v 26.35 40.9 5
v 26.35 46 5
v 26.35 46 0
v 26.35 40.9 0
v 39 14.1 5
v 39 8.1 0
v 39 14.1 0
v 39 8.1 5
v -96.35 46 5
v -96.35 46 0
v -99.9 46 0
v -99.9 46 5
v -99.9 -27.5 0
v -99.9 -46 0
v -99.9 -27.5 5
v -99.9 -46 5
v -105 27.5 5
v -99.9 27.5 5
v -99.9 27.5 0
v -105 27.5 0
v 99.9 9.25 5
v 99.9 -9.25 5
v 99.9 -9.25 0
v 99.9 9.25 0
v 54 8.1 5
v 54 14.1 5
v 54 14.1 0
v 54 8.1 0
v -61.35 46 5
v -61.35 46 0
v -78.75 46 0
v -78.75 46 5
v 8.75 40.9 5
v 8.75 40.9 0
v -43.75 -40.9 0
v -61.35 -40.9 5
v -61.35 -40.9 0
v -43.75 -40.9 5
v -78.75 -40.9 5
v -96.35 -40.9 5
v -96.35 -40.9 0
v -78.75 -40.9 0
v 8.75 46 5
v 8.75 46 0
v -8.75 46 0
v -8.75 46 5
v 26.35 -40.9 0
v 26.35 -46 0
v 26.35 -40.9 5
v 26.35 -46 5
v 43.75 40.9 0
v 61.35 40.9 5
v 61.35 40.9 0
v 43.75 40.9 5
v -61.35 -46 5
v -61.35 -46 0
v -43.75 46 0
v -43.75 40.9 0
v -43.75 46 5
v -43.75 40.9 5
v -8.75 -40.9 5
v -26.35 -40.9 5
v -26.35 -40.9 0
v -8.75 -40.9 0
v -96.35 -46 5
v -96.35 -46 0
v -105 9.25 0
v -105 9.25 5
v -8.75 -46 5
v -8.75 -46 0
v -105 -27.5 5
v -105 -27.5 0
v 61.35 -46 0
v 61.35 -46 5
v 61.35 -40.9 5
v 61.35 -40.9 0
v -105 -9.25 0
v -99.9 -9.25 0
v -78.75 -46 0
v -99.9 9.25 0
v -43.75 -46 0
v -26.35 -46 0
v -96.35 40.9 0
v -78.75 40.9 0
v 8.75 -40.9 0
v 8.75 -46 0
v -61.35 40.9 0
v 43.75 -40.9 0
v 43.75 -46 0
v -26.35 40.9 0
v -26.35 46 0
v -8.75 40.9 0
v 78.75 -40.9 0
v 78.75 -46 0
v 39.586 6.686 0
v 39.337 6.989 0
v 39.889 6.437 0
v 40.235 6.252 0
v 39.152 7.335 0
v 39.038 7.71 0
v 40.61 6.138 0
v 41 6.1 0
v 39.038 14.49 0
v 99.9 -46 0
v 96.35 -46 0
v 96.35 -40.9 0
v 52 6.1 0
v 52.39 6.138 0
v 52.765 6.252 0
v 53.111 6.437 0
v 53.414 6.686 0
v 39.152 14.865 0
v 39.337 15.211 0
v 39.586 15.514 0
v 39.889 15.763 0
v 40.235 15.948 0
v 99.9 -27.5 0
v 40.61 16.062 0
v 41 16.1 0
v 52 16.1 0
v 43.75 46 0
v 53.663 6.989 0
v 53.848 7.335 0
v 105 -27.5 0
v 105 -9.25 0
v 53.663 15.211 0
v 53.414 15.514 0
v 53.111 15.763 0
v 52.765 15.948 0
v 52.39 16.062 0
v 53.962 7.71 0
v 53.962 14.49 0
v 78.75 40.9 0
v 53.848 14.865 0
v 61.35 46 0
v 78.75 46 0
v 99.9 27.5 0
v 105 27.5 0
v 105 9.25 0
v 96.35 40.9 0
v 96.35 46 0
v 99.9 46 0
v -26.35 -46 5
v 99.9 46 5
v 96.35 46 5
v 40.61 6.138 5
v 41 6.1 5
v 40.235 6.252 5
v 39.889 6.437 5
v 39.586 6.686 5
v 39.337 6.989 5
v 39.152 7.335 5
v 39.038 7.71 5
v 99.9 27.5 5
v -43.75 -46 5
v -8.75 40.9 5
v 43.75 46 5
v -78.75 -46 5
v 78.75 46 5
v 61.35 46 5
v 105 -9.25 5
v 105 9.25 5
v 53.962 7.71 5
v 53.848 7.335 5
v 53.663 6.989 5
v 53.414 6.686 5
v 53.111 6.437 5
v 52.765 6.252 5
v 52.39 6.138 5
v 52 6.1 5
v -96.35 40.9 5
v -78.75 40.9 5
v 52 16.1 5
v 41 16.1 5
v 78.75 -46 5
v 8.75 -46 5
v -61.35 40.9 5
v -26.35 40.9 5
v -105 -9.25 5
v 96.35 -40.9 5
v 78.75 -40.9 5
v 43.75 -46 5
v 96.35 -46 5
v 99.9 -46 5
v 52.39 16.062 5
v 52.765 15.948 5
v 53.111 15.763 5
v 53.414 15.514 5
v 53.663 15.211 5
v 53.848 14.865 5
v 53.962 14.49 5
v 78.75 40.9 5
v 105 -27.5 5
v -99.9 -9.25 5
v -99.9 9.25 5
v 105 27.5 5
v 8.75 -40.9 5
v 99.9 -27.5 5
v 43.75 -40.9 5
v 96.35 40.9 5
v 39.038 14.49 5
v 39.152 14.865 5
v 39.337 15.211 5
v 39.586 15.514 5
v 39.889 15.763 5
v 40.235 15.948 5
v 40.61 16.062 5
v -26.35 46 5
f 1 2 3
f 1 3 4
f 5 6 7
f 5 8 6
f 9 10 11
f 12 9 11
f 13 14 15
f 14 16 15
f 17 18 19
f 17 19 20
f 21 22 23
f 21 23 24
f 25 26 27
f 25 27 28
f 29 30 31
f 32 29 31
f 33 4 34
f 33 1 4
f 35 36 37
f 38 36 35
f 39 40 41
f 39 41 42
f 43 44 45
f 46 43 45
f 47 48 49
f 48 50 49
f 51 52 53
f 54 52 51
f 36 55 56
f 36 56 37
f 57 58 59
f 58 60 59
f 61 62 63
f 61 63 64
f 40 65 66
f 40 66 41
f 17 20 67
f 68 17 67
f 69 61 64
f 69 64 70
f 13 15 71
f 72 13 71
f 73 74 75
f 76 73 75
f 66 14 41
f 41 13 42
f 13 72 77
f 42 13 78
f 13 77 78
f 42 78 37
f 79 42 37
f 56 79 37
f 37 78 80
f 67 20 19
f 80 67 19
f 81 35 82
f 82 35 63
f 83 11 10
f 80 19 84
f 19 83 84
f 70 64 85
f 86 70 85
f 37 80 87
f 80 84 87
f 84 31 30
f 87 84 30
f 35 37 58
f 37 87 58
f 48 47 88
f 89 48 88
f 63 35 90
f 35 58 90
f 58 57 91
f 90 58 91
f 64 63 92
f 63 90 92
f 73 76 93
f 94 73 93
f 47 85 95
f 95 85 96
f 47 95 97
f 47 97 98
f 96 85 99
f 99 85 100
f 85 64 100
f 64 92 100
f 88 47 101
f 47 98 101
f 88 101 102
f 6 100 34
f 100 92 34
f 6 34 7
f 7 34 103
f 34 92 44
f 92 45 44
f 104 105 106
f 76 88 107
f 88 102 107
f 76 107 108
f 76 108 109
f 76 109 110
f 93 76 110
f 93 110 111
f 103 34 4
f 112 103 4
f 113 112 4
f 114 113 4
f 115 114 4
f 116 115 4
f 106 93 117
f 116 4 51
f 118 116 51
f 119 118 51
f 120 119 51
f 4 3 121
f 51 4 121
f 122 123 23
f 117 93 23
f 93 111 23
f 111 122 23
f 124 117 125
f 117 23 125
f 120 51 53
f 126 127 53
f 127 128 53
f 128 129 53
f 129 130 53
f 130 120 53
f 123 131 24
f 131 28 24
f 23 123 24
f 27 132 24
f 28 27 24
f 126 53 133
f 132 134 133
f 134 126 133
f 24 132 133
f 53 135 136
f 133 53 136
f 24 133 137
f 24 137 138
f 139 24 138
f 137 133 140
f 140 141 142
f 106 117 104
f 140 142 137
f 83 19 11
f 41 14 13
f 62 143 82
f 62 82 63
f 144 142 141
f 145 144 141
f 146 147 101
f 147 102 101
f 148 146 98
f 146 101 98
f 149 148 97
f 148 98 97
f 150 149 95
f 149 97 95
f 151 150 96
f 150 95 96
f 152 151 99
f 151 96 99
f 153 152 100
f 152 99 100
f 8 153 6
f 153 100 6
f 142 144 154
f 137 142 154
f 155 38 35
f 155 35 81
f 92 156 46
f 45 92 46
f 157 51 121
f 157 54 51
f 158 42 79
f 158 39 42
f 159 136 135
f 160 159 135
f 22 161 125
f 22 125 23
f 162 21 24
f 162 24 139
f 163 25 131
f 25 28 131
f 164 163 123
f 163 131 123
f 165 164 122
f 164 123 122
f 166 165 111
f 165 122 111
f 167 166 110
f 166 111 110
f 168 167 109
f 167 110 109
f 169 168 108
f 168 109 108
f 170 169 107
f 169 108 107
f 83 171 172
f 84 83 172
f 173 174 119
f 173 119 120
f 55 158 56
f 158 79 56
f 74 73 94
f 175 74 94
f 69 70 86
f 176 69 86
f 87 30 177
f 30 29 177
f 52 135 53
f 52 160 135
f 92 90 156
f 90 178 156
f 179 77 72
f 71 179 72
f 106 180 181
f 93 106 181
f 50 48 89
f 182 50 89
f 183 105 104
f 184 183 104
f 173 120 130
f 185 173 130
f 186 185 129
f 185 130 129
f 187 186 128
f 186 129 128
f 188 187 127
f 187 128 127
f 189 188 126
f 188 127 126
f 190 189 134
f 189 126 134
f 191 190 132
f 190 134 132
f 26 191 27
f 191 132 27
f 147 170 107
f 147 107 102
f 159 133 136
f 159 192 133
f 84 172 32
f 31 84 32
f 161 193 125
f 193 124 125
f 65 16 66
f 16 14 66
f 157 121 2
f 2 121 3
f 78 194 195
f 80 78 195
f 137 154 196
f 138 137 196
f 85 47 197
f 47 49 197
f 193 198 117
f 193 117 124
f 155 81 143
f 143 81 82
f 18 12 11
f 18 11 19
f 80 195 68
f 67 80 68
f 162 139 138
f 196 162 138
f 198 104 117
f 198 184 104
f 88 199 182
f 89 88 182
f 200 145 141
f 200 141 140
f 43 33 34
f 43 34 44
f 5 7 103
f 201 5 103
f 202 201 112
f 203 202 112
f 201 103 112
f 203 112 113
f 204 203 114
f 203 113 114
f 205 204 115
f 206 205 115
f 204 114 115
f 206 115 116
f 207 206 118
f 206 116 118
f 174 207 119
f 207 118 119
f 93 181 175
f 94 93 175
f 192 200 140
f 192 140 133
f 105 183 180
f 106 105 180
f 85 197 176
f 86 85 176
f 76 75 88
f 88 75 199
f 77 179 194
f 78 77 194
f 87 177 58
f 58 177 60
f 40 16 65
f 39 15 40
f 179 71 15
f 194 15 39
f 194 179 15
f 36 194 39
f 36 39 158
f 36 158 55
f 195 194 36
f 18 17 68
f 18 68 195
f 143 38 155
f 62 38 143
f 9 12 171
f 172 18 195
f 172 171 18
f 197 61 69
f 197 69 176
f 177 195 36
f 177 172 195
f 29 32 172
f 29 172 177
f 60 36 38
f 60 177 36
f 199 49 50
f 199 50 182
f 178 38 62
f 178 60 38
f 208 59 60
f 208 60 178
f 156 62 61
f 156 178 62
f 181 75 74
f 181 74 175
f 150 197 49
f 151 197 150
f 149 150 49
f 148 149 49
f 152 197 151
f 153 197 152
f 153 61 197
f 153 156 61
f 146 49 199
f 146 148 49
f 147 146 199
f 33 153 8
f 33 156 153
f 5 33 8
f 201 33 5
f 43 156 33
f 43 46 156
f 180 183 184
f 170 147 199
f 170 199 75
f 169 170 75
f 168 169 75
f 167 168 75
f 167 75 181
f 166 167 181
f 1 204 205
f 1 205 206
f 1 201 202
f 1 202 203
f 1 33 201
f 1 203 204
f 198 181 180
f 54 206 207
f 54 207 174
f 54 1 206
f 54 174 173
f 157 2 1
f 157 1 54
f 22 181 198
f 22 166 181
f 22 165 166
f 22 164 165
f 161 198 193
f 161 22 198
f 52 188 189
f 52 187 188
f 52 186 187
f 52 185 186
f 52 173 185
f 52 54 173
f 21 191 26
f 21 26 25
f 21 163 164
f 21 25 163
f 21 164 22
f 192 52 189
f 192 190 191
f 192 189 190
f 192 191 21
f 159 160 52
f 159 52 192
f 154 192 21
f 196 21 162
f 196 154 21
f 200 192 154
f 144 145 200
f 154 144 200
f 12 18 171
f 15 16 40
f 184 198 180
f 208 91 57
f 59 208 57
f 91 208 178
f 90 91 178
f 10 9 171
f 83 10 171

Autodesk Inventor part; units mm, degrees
ref_plane "YZ Plane" through (0, 0, 0) normal (1, 0, 0) x (0, 1, 0)
ref_plane "XZ Plane" through (0, 0, 0) normal (0, 1, 0) x (-1, 0, 0)
ref_plane "XY Plane" through (0, 0, 0) normal (0, 0, 1) x (1, 0, 0)
sketch "Sketch1" plane through (0, 0, 0) normal (0, 0, 1) x (1, 0, 0)
  line L0 (-105, -46) -> (105, -46)
  line L1 (105, -46) -> (105, 46)
  line L2 (105, 46) -> (-105, 46)
  line L3 (-105, 46) -> (-105, -46)
  line L4 (-105, -46) -> (105, 46) construction
  line L5 (105, -46) -> (-105, 46) construction
  point P0 (0, 0)
  dimension "d0" = 210
  dimension "d1" = 92
extrude "Extrusion1" add sketch "Sketch1" along normal blind 5
sketch "Sketch2" plane through (0, 0, 5) normal (0, 0, 1) x (1, 0, 0)
  line L0 (39, 16.1) -> (54, 16.1)
  line L1 (54, 16.1) -> (54, 6.1)
  line L2 (54, 6.1) -> (39, 6.1)
  line L3 (39, 6.1) -> (39, 16.1)
  line L4 (-3, 9.6) -> (85, 9.6) construction
  line L5 (85, 9.6) -> (85, 8) construction
  line L6 (85, 8) -> (-3, 8) construction
  line L7 (-3, 8) -> (-3, 9.6) construction
  line L8 (-105, -46) -> (105, -46) construction
  line L9 (7.25, 15.6) -> (17.25, 15.6)
  line L10 (17.25, 15.6) -> (17.25, 10.6)
  line L11 (17.25, 10.6) -> (7.25, 10.6)
  line L12 (7.25, 10.6) -> (7.25, 15.6)
  line L13 (105, -46) -> (105, 46) projected
  line L14 (17.25, 10.6) -> (7.25, 15.6) construction
  line L15 (17.25, 15.6) -> (7.25, 10.6) construction
  line L16 (54, 6.1) -> (39, 16.1) construction
  line L17 (39, 6.1) -> (54, 16.1) construction
  point P0 (0, 0)
  point P1 (85, 8.8)
  point P2 (54, 11.1)
  point P3 (12.25, 13.1)
  point P4 (12.25, 13.1)
  point P5 (46.5, 11.1)
  point P6 (46.5, 11.1)
  dimension "d4" = 1.6
  dimension "d5" = 55.6
  dimension "d7" = 15
  dimension "d8" = 10
  dimension "d9" = 10
  dimension "d10" = 5
  dimension "d12" = 88
  dimension "d13" = 20
  dimension "d17" = 3.5
  dimension "d18" = 72.75
  dimension "d19" = 1.5
  dimension "d20" = 38.5
extrude "Extrusion2" cut sketch "Sketch2" against normal blind 5 contours L0 L1 L2 L3
fillet "Fillet1" radius 2 4 edges at (39, 16.1, 2.5) (39, 6.1, 2.5) (54, 6.1, 2.5) (54, 16.1, 2.5)
sketch "Sketch3" plane through (0, 0, 5) normal (0, 0, 1) x (1, 0, 0)
  line L0 (-8.75, 46) -> (-26.35, 46)
  line L1 (-26.35, 46) -> (-26.35, 40.9)
  line L2 (-26.35, 40.9) -> (-8.75, 40.9)
  line L3 (-8.75, 40.9) -> (-8.75, 46)
  line L4 (-43.75, 46) -> (-61.35, 46)
  line L5 (-61.35, 46) -> (-61.35, 40.9)
  line L6 (-61.35, 40.9) -> (-43.75, 40.9)
  line L7 (-43.75, 40.9) -> (-43.75, 46)
  line L8 (-78.75, 46) -> (-96.35, 46)
  line L9 (-96.35, 46) -> (-96.35, 40.9)
  line L10 (-96.35, 40.9) -> (-78.75, 40.9)
  line L11 (-78.75, 40.9) -> (-78.75, 46)
  line L12 (0, 0) -> (0, 46) construction
  line L13 (78.75, 40.9) -> (78.75, 46)
  line L14 (96.35, 40.9) -> (78.75, 40.9)
  line L15 (96.35, 46) -> (96.35, 40.9)
  line L16 (78.75, 46) -> (96.35, 46)
  line L17 (8.75, 40.9) -> (8.75, 46)
  line L18 (26.35, 40.9) -> (8.75, 40.9)
  line L19 (8.75, 46) -> (26.35, 46)
  line L20 (26.35, 46) -> (26.35, 40.9)
  line L21 (43.75, 40.9) -> (43.75, 46)
  line L22 (61.35, 46) -> (61.35, 40.9)
  line L23 (43.75, 46) -> (61.35, 46)
  line L24 (61.35, 40.9) -> (43.75, 40.9)
  line L25 (0, 0) -> (105, 0) construction
  line L26 (-96.35, -40.9) -> (-78.75, -40.9)
  line L27 (-78.75, -40.9) -> (-78.75, -46)
  line L28 (-78.75, -46) -> (-96.35, -46)
  line L29 (-61.35, -40.9) -> (-43.75, -40.9)
  line L30 (-43.75, -40.9) -> (-43.75, -46)
  line L31 (-43.75, -46) -> (-61.35, -46)
  line L32 (-26.35, -46) -> (-26.35, -40.9)
  line L33 (-26.35, -40.9) -> (-8.75, -40.9)
  line L34 (-96.35, -46) -> (-96.35, -40.9)
  line L35 (-61.35, -46) -> (-61.35, -40.9)
  line L36 (-8.75, -40.9) -> (-8.75, -46)
  line L37 (-8.75, -46) -> (-26.35, -46)
  line L38 (8.75, -40.9) -> (8.75, -46)
  line L39 (26.35, -40.9) -> (8.75, -40.9)
  line L40 (8.75, -46) -> (26.35, -46)
  line L41 (26.35, -46) -> (26.35, -40.9)
  line L42 (43.75, -40.9) -> (43.75, -46)
  line L43 (61.35, -46) -> (61.35, -40.9)
  line L44 (43.75, -46) -> (61.35, -46)
  line L45 (61.35, -40.9) -> (43.75, -40.9)
  line L46 (78.75, -40.9) -> (78.75, -46)
  line L47 (78.75, -46) -> (96.35, -46)
  line L48 (96.35, -46) -> (96.35, -40.9)
  line L49 (96.35, -40.9) -> (78.75, -40.9)
  line L50 (105, 46) -> (-105, 46) projected
  line L51 (-105, 46) -> (-105, -46) projected
  line L52 (-105, -46) -> (105, -46) projected
  line L53 (105, -46) -> (105, 46) projected
  line L54 (-105, 46) -> (-99.9, 46)
  line L55 (-99.9, 46) -> (-99.9, 27.5)
  line L56 (-99.9, 27.5) -> (-105, 27.5)
  line L57 (-105, 27.5) -> (-105, 46)
  line L58 (-105, -46) -> (-99.9, -46)
  line L59 (-99.9, -46) -> (-99.9, -27.5)
  line L60 (-99.9, -27.5) -> (-105, -27.5)
  line L61 (-105, -27.5) -> (-105, -46)
  line L62 (-105, -9.25) -> (-99.9, -9.25)
  line L63 (-99.9, -9.25) -> (-99.9, 9.25)
  line L64 (-99.9, 9.25) -> (-105, 9.25)
  line L65 (-105, 9.25) -> (-105, -9.25)
  line L66 (105, 46) -> (99.9, 46)
  line L67 (99.9, 46) -> (99.9, 27.5)
  line L68 (99.9, 27.5) -> (105, 27.5)
  line L69 (105, 27.5) -> (105, 46)
  line L70 (105, -46) -> (99.9, -46)
  line L71 (99.9, -46) -> (99.9, -27.5)
  line L72 (99.9, -27.5) -> (105, -27.5)
  line L73 (105, -27.5) -> (105, -46)
  line L74 (105, -9.25) -> (99.9, -9.25)
  line L75 (99.9, -9.25) -> (99.9, 9.25)
  line L76 (99.9, 9.25) -> (105, 9.25)
  line L77 (105, 9.25) -> (105, -9.25)
  point P0 (-17.55, 40.9)
  point P1 (-52.55, 40.9)
  point P2 (-87.55, 40.9)
  point P3 (87.55, 40.9)
  point P4 (17.55, 40.9)
  point P5 (52.55, 40.9)
  point P6 (-87.55, -40.9)
  point P7 (-52.55, -40.9)
  point P8 (-17.55, -40.9)
  point P9 (0, -46)
  point P10 (17.55, -40.9)
  point P11 (52.55, -40.9)
  point P12 (87.55, -40.9)
  point P13 (-105, 0)
  dimension "d27" = 17.55
  dimension "d28" = 17.6
  dimension "d29" = 5.1
  dimension "d30" = 35
  dimension "d32" = 210
  dimension "d35" = 92
  dimension "d38" = 18.5
extrude "Extrusion3" cut sketch "Sketch3" against normal blind 5 contours L3 L2 L1 L0 | L19 L20 L18 L17 | L7 L6 L5 L4 | L23 L22 L24 L21 | L11 L10 L9 L8 | L16 L15 L14 L13 | L55 L56 L51 L50 | L50 L53 L68 L67 | L64 L63 L62 L51 | L53 L74 L75 L76 | L60 L59 L52 L51 | L53 L52 L71 L72 | L34 L26 L27 L28 | L47 L46 L49 L48 | L35 L29 L30 L31 | L44 L42 L45 L43 | L32 L33 L36 L37 | L40 L38 L39 L41
equation "\"d30\" = 0.166667 * d32"
properties part number "Backplate" material "MDF Medium Density Fiberboard"
